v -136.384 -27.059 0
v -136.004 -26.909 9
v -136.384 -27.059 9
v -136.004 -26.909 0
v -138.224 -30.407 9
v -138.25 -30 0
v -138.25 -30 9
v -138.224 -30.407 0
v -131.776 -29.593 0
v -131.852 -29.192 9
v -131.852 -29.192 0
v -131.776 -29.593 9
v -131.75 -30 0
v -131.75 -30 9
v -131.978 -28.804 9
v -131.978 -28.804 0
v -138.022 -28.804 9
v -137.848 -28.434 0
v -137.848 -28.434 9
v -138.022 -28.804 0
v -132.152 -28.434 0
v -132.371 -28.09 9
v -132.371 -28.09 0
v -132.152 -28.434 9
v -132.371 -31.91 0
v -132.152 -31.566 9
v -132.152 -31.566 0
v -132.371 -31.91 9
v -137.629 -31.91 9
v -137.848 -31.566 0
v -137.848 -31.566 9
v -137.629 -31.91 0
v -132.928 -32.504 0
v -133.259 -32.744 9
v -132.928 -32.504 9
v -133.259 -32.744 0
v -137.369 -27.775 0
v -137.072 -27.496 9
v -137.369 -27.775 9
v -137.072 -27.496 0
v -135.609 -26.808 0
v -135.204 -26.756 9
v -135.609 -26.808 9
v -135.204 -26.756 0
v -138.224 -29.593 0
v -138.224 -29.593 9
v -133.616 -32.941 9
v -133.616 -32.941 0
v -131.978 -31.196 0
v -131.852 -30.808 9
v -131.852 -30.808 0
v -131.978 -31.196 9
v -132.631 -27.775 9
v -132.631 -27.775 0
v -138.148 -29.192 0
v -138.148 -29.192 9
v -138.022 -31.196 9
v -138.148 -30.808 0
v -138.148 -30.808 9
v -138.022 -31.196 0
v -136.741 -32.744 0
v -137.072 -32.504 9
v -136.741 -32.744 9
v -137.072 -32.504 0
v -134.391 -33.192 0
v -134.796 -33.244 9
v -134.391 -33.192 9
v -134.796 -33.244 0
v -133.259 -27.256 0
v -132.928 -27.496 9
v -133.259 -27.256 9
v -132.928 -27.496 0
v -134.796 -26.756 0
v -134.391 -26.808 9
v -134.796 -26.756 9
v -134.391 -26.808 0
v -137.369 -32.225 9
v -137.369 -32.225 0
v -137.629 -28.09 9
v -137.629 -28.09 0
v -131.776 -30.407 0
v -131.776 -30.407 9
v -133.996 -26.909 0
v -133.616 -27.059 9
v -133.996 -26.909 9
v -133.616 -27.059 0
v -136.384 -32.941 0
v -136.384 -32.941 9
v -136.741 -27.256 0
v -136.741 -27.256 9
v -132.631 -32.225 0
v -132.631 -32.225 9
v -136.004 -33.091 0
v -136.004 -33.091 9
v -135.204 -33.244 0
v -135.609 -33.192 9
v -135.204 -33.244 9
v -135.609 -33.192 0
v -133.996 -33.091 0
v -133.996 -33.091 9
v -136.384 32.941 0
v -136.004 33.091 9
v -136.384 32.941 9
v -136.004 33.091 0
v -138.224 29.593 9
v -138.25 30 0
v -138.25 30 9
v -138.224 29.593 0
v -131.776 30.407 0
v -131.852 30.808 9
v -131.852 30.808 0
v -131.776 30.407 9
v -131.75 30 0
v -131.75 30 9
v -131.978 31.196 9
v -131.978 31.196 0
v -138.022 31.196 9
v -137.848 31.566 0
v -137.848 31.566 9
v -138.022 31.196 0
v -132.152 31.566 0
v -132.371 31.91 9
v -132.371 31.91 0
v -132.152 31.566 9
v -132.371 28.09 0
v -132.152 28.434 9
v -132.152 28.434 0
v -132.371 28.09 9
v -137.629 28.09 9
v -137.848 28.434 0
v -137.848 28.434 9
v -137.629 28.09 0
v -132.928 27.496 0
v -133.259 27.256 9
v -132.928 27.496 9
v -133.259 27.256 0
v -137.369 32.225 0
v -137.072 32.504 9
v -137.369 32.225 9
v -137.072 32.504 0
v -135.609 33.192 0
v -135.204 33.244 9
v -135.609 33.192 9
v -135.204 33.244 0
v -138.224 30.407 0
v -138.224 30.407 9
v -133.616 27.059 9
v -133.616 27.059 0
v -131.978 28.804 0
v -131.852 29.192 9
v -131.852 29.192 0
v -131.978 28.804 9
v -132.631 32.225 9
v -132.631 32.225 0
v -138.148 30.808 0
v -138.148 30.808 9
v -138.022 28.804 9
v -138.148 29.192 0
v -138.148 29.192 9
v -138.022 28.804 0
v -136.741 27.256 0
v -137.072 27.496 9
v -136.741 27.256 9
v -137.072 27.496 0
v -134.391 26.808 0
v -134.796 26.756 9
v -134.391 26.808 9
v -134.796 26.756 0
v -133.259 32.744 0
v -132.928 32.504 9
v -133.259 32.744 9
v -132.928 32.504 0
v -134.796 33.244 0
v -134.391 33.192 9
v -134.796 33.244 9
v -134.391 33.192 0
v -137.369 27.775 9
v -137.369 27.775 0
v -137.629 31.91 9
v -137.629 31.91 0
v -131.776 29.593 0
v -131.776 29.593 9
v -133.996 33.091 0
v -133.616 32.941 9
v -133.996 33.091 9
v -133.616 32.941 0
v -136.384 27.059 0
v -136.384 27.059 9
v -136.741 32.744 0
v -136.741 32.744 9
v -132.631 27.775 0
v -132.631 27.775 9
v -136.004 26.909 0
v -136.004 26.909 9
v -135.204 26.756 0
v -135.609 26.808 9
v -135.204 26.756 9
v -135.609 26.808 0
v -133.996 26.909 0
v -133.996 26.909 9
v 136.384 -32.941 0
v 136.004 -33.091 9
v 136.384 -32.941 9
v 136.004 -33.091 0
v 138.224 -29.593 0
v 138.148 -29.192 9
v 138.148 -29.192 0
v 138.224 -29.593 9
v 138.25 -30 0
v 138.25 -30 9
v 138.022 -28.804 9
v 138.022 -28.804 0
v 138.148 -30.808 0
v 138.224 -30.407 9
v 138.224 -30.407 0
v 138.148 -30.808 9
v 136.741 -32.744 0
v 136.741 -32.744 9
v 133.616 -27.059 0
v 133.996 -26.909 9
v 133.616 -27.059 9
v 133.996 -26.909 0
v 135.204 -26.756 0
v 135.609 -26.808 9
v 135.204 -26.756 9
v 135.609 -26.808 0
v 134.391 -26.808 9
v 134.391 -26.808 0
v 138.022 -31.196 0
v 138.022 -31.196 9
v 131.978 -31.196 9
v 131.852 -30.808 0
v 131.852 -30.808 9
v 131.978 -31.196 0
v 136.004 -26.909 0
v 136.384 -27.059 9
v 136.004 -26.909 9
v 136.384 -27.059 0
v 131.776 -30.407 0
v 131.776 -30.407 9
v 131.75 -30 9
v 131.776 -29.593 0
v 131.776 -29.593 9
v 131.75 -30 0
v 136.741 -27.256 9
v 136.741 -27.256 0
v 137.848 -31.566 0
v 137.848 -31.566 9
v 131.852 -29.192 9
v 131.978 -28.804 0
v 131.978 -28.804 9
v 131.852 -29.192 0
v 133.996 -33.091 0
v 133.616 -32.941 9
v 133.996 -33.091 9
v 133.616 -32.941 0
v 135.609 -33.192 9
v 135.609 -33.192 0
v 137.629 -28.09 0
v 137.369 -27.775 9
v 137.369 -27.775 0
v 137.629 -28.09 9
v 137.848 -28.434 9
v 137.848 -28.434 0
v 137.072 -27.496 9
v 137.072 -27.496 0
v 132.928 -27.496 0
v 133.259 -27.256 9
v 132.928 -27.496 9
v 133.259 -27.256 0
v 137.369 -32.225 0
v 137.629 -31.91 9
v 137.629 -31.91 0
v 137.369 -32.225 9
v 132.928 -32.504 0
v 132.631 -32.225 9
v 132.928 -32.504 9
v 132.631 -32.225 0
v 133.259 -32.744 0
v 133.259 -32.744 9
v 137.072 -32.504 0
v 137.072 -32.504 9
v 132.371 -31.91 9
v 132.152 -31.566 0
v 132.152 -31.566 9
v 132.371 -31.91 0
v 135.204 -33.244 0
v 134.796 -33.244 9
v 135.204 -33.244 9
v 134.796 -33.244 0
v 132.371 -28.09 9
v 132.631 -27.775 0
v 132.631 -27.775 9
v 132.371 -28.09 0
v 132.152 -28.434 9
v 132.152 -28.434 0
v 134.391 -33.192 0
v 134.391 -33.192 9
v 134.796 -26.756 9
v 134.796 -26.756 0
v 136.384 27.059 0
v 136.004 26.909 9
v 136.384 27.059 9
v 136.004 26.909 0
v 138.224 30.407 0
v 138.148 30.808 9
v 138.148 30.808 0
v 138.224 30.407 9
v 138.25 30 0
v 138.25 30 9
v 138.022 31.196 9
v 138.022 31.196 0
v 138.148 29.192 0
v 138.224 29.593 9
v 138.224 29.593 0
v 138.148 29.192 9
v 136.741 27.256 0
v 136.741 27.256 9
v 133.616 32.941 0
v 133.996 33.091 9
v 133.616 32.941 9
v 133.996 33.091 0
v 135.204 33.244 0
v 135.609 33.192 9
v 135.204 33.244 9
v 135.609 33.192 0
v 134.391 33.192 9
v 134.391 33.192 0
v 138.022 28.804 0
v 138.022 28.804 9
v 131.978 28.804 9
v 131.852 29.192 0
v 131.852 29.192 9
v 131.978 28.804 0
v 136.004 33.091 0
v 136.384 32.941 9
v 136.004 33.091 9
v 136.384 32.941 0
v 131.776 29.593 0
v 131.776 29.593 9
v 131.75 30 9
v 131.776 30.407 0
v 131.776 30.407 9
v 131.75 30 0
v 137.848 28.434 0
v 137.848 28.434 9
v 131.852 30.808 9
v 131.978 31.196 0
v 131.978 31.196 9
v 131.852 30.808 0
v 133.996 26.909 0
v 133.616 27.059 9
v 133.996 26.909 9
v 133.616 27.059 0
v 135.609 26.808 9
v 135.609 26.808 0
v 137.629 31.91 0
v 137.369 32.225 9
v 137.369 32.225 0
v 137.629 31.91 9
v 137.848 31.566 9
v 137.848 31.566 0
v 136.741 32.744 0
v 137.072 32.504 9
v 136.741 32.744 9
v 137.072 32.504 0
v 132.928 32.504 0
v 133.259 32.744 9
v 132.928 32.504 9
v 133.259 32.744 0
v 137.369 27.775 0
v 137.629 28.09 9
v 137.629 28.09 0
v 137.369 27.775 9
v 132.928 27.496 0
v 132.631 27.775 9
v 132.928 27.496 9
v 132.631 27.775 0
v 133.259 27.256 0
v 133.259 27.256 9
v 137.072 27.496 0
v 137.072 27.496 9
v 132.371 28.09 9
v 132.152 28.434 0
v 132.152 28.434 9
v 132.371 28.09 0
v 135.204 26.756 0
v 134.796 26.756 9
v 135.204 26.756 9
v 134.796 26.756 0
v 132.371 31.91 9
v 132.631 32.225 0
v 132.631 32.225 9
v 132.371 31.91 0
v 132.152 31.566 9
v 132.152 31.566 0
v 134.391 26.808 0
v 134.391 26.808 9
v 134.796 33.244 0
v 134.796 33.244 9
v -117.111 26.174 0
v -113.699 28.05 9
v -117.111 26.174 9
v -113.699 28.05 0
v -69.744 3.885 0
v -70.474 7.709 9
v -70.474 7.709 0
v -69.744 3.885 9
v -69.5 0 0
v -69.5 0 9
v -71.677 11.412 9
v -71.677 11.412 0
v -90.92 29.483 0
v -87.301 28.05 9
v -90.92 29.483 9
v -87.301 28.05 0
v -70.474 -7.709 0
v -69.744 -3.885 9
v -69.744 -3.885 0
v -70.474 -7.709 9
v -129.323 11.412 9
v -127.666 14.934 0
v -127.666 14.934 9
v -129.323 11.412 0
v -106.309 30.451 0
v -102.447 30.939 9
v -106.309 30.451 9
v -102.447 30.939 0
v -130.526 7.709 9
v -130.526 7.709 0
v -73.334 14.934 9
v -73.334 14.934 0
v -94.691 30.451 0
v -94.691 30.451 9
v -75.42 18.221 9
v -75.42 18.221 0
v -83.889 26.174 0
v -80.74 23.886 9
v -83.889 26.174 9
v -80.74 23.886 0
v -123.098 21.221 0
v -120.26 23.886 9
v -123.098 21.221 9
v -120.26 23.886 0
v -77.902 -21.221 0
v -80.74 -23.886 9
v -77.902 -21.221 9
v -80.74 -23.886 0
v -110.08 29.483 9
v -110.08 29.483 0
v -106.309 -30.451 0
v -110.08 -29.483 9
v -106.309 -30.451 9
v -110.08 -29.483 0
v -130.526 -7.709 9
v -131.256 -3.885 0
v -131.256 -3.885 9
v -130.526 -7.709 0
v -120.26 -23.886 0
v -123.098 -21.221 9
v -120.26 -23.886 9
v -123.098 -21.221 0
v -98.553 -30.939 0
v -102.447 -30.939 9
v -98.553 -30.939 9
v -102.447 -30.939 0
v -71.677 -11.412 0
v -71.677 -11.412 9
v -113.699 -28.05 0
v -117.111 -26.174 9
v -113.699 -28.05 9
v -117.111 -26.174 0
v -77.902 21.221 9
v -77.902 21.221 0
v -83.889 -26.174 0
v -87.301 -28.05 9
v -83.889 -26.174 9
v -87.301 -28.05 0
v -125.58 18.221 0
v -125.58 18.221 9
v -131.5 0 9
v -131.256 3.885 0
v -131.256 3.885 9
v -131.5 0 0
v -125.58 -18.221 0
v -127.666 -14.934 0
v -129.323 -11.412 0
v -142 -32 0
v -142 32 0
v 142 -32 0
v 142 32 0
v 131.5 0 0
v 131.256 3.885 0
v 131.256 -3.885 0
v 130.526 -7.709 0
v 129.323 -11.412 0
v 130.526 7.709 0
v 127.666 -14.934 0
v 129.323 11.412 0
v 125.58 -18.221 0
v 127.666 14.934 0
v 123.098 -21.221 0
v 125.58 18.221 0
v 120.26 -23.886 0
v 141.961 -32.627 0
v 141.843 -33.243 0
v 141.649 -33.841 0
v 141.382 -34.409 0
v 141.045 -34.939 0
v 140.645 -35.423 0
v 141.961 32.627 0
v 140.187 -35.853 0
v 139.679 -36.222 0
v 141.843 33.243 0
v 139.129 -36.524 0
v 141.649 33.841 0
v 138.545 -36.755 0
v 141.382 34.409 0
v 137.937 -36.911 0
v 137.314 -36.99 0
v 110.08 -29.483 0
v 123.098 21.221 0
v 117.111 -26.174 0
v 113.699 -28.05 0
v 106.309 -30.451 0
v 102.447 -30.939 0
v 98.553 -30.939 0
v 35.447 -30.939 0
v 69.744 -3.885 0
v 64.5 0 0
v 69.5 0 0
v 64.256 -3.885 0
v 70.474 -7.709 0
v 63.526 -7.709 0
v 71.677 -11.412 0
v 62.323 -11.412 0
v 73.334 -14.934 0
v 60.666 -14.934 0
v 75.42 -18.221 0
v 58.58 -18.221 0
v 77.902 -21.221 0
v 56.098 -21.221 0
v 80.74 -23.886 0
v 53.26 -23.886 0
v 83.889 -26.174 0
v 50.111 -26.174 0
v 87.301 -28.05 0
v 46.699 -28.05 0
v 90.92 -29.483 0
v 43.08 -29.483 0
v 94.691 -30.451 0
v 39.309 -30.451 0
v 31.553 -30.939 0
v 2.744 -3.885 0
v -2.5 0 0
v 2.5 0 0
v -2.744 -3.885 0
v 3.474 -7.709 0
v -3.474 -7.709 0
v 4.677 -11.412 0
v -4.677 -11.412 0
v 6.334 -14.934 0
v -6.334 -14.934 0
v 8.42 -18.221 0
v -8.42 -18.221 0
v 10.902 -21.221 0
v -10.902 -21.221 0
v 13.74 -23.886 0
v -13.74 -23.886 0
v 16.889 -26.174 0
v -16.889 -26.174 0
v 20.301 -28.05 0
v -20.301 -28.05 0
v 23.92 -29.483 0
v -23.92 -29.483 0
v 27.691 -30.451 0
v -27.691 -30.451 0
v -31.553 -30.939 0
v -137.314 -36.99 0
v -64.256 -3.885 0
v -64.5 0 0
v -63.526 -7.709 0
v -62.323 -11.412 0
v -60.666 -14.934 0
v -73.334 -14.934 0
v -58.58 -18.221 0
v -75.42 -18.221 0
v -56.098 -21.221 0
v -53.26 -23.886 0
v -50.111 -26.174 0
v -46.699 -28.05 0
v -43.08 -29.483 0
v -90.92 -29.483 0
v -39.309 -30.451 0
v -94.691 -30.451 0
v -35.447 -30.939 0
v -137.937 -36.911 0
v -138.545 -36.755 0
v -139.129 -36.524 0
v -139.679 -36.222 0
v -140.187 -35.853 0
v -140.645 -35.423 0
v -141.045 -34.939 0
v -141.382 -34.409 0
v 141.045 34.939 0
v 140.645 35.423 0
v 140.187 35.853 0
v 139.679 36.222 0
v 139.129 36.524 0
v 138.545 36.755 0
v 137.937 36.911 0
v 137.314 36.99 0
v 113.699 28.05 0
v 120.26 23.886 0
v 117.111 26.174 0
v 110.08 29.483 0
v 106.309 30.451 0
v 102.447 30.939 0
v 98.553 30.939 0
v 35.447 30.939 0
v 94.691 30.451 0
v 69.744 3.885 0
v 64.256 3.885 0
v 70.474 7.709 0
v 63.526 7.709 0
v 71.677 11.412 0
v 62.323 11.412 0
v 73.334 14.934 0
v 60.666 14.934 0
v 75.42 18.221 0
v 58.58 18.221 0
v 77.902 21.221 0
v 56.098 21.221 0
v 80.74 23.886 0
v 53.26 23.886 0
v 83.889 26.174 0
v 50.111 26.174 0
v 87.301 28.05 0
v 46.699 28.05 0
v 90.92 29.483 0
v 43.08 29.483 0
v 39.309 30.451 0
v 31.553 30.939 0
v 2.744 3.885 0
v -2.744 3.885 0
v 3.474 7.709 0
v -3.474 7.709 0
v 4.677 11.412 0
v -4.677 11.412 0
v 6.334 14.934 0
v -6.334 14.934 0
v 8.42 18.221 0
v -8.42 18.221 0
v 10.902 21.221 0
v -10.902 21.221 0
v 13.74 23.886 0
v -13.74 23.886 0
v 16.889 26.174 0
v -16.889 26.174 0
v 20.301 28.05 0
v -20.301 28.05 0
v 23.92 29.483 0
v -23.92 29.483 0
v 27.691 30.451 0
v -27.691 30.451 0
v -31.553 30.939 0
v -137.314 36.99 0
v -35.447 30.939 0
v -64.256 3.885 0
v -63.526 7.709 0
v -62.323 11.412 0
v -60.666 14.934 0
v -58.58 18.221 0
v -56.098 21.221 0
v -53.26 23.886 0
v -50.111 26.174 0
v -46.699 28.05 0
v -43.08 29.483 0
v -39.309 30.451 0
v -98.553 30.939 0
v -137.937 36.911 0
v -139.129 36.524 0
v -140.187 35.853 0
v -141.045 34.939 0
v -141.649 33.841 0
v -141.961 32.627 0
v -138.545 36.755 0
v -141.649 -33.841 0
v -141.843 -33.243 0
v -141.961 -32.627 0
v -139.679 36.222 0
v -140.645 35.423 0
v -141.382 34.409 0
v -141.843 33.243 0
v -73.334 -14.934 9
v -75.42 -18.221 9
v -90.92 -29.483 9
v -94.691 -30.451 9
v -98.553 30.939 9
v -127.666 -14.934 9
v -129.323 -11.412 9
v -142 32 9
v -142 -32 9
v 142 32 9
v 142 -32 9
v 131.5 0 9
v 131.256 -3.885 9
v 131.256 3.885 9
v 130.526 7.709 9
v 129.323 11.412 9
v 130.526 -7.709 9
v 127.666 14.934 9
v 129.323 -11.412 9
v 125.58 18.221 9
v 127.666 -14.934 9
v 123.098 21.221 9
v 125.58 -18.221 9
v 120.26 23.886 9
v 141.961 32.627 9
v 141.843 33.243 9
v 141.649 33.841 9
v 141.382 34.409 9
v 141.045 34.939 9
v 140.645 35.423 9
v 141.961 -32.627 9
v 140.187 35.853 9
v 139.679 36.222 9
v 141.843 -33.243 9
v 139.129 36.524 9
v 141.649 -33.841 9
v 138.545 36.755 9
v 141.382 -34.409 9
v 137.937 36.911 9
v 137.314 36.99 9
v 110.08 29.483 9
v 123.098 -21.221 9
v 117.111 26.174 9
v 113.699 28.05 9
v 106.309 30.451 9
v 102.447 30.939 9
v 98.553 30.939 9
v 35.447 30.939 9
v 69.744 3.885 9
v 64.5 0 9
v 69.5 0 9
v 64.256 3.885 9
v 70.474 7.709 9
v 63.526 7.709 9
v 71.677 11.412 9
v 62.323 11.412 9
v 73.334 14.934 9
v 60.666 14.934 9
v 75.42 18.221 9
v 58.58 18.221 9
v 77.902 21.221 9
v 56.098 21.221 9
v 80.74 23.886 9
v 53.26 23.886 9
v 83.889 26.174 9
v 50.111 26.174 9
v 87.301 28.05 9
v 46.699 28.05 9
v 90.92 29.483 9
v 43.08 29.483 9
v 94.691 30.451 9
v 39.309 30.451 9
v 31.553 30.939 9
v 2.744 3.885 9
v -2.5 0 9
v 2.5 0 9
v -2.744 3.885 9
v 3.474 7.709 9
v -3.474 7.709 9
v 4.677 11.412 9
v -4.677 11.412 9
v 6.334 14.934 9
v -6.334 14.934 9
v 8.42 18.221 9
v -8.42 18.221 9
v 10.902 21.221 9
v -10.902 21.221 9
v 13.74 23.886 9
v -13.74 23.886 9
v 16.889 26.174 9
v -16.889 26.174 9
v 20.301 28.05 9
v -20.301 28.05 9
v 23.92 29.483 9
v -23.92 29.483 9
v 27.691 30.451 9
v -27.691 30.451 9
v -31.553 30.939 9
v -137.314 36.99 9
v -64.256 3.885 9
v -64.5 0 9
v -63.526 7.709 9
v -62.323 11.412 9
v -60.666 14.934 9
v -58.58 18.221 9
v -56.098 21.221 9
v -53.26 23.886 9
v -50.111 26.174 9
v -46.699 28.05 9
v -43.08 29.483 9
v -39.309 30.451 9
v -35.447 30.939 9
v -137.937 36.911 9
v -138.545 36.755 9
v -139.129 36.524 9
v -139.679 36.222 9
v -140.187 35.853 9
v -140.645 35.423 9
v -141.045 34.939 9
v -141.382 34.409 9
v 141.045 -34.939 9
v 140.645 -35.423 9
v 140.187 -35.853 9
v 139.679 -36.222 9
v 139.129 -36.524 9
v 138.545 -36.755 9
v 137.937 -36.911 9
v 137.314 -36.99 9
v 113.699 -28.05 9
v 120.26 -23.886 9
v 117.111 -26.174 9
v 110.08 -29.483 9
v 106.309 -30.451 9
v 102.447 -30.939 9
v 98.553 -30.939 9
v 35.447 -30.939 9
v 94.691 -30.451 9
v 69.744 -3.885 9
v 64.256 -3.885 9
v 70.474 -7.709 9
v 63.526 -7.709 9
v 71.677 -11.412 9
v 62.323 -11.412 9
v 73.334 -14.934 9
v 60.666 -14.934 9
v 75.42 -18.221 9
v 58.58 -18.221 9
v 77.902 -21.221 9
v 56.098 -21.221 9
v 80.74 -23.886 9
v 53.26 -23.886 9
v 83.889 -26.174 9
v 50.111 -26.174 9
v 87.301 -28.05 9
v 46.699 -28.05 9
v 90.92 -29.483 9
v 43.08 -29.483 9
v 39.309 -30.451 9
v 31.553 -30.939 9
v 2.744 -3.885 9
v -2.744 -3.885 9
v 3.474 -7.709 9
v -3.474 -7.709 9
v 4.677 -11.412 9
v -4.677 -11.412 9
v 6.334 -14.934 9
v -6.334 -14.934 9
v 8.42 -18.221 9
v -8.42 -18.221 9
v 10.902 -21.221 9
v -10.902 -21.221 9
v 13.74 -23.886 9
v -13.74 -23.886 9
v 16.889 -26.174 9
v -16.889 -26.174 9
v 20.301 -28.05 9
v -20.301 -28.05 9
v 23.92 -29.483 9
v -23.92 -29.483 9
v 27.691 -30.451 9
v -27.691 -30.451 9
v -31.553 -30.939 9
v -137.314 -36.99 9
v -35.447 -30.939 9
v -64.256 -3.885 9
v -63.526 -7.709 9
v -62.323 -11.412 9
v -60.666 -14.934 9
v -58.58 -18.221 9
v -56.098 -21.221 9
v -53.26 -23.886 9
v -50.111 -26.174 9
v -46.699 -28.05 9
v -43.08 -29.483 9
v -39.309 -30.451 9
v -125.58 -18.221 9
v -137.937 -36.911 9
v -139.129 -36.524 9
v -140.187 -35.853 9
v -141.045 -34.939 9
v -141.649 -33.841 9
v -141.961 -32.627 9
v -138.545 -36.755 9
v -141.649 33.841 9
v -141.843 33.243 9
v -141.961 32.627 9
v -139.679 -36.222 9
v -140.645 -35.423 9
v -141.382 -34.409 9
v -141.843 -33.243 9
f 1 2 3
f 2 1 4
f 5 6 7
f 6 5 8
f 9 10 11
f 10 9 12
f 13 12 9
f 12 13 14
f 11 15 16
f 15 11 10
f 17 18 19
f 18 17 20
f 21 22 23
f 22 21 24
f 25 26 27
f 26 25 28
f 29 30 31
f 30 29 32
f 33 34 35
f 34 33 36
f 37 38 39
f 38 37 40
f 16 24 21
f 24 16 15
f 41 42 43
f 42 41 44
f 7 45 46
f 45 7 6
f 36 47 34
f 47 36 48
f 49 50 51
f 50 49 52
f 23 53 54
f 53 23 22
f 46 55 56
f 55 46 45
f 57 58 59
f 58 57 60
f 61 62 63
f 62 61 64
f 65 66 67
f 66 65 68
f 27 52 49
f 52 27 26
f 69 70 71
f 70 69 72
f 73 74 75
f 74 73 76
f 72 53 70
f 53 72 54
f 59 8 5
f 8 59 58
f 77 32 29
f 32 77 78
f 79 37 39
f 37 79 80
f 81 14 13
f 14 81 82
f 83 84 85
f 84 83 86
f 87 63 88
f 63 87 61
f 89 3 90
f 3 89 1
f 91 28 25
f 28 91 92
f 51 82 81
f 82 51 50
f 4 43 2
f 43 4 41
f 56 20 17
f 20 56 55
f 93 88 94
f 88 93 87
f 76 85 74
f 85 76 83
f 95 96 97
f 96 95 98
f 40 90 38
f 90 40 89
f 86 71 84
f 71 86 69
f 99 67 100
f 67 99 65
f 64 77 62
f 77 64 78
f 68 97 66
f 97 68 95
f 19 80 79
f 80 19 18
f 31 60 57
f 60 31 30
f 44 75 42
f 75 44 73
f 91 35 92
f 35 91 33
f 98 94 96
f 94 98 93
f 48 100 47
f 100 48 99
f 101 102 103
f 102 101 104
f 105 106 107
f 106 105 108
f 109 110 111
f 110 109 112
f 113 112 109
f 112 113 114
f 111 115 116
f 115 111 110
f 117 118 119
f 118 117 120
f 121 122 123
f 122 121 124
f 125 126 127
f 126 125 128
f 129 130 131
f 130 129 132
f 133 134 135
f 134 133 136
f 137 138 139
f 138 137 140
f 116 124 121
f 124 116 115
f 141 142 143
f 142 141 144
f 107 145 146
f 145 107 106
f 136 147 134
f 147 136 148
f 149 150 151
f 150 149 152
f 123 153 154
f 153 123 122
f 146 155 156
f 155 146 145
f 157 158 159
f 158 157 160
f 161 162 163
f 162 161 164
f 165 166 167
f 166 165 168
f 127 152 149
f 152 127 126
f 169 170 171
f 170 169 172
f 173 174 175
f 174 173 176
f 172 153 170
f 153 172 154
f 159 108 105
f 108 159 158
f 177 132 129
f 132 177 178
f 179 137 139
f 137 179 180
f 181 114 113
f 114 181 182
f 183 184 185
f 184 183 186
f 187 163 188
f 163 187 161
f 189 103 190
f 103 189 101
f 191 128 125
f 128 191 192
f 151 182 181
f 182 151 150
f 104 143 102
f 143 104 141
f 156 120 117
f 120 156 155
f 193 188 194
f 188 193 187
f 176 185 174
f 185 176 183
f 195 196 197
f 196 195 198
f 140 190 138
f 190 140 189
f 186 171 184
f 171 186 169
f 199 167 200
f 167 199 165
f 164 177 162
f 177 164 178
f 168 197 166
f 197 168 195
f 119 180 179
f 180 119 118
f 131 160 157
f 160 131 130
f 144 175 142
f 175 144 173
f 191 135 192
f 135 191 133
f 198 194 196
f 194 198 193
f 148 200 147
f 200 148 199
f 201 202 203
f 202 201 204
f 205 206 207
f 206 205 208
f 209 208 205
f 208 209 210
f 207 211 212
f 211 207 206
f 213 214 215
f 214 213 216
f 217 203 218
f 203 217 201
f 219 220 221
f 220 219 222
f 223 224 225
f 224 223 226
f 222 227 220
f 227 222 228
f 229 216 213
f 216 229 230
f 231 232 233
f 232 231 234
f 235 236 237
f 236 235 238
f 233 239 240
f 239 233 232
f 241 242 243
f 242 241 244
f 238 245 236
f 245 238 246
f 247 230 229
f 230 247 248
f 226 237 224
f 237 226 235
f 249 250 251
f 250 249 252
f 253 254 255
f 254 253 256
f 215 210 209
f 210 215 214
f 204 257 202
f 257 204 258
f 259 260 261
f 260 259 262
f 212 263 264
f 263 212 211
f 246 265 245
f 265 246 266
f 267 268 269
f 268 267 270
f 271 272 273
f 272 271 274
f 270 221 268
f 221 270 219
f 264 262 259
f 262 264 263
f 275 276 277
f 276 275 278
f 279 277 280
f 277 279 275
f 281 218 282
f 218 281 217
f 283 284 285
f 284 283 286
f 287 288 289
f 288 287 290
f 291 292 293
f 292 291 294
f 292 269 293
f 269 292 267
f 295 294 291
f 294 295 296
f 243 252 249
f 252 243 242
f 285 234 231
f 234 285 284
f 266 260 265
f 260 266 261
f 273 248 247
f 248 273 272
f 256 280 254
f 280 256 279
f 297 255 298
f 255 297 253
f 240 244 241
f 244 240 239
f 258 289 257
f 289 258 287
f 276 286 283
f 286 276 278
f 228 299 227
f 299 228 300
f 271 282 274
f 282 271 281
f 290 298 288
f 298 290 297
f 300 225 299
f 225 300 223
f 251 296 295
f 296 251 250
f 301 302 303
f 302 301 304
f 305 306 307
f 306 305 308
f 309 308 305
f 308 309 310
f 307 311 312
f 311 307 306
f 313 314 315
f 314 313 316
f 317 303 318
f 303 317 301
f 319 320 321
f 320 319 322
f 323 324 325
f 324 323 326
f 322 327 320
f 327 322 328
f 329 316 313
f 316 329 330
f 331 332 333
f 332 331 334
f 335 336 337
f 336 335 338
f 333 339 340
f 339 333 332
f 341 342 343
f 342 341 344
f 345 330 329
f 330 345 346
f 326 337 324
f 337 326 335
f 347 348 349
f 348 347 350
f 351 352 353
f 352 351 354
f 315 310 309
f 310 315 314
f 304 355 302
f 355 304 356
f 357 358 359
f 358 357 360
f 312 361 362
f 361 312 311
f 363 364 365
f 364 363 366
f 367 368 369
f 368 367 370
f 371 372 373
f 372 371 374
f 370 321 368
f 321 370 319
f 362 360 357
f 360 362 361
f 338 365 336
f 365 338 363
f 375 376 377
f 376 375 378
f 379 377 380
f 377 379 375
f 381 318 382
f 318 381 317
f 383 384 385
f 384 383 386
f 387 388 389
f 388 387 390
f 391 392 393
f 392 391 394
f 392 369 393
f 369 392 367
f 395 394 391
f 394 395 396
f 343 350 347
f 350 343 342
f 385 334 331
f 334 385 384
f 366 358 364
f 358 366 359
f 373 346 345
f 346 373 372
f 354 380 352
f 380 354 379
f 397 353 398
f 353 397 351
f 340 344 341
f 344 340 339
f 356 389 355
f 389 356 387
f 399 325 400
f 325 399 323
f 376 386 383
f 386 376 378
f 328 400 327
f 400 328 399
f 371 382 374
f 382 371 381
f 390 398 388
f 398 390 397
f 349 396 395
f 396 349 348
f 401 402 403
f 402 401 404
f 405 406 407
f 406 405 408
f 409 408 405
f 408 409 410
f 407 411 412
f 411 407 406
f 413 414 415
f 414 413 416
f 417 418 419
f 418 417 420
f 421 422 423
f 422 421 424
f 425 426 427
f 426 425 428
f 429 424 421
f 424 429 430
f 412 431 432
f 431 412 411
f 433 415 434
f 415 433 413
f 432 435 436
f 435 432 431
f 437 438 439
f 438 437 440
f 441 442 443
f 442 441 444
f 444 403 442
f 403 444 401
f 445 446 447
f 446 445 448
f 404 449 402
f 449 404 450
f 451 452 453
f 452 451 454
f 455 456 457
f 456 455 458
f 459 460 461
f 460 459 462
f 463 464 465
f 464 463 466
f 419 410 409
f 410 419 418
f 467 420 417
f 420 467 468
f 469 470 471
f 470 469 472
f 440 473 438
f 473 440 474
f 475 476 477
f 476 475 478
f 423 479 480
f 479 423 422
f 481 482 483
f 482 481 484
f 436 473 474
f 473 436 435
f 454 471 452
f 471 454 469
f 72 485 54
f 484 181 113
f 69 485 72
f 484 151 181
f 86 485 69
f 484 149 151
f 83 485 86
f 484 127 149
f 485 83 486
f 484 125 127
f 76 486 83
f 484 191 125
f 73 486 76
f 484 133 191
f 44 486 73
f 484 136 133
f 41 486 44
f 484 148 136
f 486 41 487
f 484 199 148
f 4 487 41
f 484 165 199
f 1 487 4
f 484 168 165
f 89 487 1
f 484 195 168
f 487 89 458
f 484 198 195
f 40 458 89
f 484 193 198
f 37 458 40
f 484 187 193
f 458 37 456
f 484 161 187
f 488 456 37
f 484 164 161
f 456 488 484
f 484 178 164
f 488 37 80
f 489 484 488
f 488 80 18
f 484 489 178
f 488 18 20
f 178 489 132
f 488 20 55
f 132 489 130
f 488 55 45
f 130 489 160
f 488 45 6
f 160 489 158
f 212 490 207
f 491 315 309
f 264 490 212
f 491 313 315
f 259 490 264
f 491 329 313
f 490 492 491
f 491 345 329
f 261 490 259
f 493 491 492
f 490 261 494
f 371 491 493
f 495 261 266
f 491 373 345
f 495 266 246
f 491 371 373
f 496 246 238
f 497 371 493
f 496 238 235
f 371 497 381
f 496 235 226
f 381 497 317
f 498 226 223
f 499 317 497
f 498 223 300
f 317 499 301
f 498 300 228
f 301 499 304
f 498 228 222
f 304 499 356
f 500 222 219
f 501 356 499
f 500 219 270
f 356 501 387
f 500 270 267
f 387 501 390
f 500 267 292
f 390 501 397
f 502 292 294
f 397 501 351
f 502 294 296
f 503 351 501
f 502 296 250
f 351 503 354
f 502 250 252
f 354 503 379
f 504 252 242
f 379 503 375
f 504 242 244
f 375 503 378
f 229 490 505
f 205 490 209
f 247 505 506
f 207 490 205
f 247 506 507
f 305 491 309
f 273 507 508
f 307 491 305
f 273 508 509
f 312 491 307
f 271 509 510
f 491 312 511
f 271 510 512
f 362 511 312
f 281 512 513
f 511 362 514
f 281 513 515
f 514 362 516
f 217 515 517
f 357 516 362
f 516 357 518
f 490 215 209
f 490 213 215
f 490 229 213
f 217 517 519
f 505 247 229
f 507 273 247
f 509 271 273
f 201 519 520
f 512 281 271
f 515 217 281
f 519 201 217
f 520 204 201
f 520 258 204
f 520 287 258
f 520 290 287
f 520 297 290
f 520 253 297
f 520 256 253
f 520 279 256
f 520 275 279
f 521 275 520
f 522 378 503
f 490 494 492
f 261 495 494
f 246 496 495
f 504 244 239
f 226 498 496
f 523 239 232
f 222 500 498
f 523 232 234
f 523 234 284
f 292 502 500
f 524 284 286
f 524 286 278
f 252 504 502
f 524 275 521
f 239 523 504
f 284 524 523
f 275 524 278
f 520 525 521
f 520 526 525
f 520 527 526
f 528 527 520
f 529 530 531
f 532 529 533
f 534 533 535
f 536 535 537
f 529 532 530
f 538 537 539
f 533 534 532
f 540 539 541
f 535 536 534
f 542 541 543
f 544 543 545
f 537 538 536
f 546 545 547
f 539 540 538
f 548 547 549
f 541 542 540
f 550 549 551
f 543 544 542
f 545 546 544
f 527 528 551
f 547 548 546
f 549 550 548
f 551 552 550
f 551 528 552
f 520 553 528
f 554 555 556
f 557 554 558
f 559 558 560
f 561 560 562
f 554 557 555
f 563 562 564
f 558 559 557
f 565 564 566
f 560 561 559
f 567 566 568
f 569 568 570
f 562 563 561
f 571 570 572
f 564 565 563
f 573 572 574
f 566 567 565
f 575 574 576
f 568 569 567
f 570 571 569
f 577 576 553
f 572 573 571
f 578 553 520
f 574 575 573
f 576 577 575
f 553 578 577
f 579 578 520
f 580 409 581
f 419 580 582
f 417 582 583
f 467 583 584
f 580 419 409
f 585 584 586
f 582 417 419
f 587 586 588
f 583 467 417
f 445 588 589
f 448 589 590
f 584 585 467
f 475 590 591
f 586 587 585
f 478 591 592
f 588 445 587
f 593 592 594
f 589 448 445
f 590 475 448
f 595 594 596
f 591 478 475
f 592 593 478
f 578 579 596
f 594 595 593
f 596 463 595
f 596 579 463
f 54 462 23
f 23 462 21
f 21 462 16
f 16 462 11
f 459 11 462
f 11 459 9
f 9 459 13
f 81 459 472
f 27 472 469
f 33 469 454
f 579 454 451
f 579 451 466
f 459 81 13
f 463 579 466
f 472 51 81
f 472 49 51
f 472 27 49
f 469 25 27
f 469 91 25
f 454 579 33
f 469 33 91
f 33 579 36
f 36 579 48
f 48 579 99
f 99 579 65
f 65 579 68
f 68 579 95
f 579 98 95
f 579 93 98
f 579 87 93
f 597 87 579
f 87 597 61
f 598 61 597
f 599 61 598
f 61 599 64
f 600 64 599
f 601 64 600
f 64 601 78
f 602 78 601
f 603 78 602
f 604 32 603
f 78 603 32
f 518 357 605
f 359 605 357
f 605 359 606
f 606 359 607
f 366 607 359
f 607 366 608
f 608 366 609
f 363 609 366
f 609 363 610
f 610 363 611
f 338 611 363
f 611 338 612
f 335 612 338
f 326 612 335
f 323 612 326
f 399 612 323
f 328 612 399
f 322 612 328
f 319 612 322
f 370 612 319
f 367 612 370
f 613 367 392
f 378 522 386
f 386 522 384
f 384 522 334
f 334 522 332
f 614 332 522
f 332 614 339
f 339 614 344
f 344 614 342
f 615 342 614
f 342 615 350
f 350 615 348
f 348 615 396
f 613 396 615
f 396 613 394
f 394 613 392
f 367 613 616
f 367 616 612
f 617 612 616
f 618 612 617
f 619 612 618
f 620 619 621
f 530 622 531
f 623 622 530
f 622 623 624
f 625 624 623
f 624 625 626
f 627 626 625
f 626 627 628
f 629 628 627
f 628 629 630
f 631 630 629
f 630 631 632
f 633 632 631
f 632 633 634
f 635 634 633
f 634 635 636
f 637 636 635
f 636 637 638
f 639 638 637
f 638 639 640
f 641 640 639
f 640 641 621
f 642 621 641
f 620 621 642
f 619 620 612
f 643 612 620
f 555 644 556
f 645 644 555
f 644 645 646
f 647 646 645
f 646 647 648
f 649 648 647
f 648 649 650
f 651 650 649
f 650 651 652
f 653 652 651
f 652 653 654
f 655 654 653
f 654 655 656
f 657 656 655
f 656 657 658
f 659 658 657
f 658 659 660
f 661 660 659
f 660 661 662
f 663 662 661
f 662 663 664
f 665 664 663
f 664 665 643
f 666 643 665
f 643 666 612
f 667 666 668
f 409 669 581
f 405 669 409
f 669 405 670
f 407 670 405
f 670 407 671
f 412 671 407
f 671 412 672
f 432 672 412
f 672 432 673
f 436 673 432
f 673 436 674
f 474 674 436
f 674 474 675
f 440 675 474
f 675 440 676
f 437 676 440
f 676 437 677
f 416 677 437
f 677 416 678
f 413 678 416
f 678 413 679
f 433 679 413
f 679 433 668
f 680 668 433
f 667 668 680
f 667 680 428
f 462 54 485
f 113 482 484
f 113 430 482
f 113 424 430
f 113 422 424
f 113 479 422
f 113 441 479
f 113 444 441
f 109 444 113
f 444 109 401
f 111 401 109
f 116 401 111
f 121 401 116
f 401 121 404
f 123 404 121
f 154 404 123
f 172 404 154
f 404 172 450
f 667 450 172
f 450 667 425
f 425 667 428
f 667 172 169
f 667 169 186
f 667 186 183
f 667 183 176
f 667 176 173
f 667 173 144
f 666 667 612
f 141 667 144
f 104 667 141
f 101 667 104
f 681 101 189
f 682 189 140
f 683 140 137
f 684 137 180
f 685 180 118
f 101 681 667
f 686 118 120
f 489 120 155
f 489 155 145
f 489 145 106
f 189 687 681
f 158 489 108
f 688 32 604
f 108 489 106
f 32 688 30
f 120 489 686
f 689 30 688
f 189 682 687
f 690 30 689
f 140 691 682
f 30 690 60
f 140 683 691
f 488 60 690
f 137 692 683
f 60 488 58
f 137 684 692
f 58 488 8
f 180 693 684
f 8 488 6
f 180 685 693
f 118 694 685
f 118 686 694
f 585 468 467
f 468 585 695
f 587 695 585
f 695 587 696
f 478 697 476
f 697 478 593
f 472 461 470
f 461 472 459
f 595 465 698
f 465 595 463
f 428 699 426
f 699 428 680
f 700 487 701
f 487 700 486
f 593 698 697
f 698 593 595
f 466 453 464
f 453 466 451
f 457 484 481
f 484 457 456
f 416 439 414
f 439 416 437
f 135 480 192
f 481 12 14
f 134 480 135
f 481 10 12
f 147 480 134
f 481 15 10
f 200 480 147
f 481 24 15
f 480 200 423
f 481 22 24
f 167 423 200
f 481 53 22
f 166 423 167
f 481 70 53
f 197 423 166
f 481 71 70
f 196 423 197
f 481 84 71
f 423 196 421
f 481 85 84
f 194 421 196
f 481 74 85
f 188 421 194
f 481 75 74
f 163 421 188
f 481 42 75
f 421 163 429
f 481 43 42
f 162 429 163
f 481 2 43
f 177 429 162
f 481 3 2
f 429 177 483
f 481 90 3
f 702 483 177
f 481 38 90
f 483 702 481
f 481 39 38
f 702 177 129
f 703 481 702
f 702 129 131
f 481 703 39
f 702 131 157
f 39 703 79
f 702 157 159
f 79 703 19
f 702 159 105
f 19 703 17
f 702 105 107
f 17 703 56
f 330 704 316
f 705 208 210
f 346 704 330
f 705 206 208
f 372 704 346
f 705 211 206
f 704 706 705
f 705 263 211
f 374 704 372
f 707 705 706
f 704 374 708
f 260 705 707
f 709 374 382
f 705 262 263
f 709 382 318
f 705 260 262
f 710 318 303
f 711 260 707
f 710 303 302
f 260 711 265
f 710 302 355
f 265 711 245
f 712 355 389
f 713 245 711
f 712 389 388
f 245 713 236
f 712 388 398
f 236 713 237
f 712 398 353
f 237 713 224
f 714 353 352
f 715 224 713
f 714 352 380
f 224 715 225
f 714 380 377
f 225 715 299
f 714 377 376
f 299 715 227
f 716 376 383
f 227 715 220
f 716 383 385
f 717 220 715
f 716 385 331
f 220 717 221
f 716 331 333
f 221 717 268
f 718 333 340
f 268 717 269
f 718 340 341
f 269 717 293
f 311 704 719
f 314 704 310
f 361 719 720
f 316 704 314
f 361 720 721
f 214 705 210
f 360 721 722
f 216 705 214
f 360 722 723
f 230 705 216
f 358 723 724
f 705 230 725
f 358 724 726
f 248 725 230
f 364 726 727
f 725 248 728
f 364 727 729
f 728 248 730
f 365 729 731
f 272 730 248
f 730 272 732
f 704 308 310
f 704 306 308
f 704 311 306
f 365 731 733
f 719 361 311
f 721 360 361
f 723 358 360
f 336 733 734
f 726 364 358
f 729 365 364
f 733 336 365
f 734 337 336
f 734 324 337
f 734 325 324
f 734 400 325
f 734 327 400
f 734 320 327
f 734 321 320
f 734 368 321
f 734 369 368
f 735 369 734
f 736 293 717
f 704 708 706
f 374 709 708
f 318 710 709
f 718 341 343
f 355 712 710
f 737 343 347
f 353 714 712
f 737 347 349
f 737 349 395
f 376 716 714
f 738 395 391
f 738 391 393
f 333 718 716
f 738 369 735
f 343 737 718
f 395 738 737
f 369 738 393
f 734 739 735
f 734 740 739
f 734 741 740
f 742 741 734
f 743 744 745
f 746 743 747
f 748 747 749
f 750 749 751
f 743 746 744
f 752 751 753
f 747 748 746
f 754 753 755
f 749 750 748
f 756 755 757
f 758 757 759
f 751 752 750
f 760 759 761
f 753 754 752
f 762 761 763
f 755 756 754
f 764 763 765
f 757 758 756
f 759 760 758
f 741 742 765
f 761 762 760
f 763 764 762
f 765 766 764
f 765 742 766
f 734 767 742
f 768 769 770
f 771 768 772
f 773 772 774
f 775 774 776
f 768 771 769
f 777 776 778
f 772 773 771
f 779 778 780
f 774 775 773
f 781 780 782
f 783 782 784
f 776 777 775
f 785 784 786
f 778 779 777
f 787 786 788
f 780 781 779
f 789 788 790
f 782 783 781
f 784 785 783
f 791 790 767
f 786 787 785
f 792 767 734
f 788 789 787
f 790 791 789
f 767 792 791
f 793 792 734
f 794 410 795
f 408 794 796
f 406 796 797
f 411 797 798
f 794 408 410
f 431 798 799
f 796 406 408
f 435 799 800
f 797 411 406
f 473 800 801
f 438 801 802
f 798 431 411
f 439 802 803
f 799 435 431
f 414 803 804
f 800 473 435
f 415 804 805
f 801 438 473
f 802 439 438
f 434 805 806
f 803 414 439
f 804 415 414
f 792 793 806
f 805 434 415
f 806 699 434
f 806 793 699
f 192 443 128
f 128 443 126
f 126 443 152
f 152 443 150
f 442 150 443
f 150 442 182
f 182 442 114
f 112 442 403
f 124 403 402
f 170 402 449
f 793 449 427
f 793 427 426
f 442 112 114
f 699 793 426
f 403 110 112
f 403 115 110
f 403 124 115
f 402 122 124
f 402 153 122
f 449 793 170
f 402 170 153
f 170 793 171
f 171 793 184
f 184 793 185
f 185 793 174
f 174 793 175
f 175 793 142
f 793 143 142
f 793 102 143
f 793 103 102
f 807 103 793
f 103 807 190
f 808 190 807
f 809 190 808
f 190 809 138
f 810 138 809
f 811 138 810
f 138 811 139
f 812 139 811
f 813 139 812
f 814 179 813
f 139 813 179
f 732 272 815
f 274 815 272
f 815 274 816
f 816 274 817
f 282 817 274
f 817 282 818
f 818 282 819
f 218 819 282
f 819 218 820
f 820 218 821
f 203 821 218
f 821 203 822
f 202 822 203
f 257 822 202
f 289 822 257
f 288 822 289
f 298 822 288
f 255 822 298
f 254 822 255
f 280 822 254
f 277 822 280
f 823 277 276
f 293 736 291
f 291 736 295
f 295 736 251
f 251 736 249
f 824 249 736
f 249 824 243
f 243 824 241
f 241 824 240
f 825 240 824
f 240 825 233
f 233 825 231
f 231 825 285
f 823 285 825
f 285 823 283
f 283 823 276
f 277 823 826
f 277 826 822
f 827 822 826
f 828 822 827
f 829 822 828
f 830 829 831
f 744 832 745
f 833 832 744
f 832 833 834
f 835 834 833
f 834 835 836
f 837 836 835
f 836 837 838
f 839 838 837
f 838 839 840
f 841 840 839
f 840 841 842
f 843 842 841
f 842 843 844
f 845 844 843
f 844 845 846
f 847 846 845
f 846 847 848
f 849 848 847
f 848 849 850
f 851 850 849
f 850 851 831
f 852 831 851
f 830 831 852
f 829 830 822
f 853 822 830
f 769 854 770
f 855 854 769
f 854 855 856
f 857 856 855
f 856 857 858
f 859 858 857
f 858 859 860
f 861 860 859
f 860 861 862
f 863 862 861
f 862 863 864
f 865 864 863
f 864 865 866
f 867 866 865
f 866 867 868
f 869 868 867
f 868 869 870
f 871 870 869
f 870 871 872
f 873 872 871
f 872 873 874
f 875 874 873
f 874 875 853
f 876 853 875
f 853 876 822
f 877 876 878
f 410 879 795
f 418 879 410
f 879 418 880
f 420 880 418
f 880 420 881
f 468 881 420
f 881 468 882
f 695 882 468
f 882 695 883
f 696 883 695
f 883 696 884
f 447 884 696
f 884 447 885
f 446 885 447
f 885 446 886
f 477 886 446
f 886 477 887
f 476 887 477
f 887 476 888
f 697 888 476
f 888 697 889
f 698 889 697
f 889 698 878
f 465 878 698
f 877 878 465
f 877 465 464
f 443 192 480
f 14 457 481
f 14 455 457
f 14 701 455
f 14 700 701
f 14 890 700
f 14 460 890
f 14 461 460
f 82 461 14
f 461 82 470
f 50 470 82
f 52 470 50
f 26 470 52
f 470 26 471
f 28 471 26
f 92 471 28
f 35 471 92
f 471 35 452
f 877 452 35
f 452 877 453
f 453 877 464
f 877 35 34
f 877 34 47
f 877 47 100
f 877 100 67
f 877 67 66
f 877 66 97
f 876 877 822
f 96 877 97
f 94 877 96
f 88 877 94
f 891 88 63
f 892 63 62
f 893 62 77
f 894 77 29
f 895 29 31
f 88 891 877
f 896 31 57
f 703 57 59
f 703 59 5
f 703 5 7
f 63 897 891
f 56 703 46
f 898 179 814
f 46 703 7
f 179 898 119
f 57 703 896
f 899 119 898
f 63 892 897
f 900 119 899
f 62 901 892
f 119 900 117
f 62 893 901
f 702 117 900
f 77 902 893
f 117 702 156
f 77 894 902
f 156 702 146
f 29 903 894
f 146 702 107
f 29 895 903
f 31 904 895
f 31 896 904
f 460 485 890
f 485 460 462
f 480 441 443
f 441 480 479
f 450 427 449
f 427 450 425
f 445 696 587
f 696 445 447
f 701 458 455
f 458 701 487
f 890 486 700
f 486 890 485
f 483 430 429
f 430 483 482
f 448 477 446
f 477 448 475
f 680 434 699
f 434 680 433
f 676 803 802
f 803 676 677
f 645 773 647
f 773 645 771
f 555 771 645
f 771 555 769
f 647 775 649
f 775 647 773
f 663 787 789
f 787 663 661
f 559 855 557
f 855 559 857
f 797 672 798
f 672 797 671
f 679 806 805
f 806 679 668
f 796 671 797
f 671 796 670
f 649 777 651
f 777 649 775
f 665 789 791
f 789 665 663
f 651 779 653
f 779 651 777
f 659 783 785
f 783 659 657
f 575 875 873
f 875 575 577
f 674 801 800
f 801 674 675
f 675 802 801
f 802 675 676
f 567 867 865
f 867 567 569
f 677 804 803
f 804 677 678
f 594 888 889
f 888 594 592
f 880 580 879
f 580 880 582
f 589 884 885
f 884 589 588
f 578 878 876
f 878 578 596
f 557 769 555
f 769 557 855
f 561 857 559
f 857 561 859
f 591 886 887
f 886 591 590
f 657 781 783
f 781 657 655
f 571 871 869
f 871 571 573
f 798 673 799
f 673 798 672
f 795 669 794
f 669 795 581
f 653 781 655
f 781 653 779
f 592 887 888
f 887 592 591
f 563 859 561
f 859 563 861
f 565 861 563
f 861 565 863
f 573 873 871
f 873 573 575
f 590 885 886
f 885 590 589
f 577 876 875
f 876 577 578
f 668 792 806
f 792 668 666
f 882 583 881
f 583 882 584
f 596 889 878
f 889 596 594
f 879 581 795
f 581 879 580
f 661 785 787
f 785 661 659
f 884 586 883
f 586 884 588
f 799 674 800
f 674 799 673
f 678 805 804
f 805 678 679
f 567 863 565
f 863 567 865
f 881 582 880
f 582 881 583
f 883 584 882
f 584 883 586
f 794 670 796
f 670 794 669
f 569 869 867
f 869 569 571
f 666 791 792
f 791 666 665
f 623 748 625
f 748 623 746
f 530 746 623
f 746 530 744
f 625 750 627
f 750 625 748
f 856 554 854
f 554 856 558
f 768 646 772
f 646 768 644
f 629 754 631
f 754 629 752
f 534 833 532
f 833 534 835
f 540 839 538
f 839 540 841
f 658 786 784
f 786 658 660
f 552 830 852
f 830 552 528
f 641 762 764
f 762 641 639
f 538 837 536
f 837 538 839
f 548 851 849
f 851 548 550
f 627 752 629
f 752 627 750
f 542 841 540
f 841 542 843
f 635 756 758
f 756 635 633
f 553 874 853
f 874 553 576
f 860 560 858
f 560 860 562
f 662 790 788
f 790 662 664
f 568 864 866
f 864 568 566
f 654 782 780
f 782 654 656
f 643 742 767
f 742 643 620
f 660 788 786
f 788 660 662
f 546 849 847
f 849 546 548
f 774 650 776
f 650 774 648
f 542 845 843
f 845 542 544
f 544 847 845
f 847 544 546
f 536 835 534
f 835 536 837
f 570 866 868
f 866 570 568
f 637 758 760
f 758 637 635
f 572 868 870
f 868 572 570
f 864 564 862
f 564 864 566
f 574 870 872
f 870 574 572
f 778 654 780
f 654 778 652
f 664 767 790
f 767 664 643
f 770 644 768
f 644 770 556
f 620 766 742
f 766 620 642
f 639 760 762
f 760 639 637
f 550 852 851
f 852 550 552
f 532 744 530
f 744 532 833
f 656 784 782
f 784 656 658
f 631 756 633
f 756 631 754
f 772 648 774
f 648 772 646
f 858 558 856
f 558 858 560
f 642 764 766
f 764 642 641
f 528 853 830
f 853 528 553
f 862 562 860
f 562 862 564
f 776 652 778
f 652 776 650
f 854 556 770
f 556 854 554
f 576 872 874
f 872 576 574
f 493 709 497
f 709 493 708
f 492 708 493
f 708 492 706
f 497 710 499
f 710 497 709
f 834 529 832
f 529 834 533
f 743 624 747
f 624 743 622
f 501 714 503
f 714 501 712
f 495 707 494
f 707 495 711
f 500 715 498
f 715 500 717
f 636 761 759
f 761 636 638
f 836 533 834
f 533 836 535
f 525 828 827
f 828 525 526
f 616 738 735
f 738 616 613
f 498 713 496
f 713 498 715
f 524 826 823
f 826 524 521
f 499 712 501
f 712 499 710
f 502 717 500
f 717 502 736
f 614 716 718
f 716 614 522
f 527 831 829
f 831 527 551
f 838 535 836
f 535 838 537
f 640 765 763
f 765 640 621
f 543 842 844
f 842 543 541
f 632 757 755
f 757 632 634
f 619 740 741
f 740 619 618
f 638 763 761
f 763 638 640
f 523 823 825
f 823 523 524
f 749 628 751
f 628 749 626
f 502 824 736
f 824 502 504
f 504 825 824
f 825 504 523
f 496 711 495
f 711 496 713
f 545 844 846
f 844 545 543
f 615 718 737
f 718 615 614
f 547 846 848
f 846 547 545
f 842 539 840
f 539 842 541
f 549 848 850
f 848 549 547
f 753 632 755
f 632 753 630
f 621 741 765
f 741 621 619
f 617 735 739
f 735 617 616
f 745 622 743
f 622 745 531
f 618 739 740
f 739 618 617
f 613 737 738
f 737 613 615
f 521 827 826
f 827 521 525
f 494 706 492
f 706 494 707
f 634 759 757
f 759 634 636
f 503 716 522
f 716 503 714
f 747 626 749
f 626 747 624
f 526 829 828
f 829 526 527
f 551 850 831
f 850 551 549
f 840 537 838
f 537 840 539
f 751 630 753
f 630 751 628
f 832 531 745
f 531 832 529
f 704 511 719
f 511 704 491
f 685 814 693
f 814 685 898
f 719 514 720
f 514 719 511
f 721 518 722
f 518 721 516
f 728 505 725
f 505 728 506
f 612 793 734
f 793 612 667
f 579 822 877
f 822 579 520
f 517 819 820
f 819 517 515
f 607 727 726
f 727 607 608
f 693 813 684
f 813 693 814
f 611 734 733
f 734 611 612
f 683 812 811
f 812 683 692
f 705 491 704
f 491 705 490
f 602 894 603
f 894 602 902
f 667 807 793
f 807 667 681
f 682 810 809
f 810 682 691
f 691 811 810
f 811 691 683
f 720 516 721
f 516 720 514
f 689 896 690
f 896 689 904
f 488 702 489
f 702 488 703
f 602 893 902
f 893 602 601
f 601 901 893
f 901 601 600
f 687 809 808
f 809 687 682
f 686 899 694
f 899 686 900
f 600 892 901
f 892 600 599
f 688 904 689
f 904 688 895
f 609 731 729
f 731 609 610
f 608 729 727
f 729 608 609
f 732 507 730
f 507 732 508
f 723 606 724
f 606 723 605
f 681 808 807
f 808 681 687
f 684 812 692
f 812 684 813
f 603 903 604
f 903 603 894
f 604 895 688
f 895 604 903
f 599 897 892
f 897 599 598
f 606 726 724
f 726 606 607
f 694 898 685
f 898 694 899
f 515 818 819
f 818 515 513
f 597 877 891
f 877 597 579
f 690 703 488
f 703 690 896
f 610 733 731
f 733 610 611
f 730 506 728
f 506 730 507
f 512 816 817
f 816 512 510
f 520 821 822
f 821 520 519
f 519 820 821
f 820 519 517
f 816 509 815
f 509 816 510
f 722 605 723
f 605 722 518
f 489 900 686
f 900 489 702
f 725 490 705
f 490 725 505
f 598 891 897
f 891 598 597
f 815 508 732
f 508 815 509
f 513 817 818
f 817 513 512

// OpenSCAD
$fn = 50;


difference() {
	union() {
		hull() {
			translate(v = [-137.0000000000, 32.0000000000, 0]) {
				cylinder(h = 9, r = 5);
			}
			translate(v = [137.0000000000, 32.0000000000, 0]) {
				cylinder(h = 9, r = 5);
			}
			translate(v = [-137.0000000000, -32.0000000000, 0]) {
				cylinder(h = 9, r = 5);
			}
			translate(v = [137.0000000000, -32.0000000000, 0]) {
				cylinder(h = 9, r = 5);
			}
		}
	}
	union() {
		#translate(v = [-135.0000000000, -30.0000000000, -100.0000000000]) {
			cylinder(h = 200, r = 3.2500000000);
		}
		#translate(v = [-135.0000000000, 30.0000000000, -100.0000000000]) {
			cylinder(h = 200, r = 3.2500000000);
		}
		#translate(v = [135.0000000000, -30.0000000000, -100.0000000000]) {
			cylinder(h = 200, r = 3.2500000000);
		}
		#translate(v = [135.0000000000, 30.0000000000, -100.0000000000]) {
			cylinder(h = 200, r = 3.2500000000);
		}
		#translate(v = [-100.5000000000, 0, 0]) {
			cylinder(h = 9, r = 31.0000000000);
		}
		#translate(v = [-33.5000000000, 0, 0]) {
			cylinder(h = 9, r = 31.0000000000);
		}
		#translate(v = [33.5000000000, 0, 0]) {
			cylinder(h = 9, r = 31.0000000000);
		}
		#translate(v = [100.5000000000, 0, 0]) {
			cylinder(h = 9, r = 31.0000000000);
		}
	}
}
